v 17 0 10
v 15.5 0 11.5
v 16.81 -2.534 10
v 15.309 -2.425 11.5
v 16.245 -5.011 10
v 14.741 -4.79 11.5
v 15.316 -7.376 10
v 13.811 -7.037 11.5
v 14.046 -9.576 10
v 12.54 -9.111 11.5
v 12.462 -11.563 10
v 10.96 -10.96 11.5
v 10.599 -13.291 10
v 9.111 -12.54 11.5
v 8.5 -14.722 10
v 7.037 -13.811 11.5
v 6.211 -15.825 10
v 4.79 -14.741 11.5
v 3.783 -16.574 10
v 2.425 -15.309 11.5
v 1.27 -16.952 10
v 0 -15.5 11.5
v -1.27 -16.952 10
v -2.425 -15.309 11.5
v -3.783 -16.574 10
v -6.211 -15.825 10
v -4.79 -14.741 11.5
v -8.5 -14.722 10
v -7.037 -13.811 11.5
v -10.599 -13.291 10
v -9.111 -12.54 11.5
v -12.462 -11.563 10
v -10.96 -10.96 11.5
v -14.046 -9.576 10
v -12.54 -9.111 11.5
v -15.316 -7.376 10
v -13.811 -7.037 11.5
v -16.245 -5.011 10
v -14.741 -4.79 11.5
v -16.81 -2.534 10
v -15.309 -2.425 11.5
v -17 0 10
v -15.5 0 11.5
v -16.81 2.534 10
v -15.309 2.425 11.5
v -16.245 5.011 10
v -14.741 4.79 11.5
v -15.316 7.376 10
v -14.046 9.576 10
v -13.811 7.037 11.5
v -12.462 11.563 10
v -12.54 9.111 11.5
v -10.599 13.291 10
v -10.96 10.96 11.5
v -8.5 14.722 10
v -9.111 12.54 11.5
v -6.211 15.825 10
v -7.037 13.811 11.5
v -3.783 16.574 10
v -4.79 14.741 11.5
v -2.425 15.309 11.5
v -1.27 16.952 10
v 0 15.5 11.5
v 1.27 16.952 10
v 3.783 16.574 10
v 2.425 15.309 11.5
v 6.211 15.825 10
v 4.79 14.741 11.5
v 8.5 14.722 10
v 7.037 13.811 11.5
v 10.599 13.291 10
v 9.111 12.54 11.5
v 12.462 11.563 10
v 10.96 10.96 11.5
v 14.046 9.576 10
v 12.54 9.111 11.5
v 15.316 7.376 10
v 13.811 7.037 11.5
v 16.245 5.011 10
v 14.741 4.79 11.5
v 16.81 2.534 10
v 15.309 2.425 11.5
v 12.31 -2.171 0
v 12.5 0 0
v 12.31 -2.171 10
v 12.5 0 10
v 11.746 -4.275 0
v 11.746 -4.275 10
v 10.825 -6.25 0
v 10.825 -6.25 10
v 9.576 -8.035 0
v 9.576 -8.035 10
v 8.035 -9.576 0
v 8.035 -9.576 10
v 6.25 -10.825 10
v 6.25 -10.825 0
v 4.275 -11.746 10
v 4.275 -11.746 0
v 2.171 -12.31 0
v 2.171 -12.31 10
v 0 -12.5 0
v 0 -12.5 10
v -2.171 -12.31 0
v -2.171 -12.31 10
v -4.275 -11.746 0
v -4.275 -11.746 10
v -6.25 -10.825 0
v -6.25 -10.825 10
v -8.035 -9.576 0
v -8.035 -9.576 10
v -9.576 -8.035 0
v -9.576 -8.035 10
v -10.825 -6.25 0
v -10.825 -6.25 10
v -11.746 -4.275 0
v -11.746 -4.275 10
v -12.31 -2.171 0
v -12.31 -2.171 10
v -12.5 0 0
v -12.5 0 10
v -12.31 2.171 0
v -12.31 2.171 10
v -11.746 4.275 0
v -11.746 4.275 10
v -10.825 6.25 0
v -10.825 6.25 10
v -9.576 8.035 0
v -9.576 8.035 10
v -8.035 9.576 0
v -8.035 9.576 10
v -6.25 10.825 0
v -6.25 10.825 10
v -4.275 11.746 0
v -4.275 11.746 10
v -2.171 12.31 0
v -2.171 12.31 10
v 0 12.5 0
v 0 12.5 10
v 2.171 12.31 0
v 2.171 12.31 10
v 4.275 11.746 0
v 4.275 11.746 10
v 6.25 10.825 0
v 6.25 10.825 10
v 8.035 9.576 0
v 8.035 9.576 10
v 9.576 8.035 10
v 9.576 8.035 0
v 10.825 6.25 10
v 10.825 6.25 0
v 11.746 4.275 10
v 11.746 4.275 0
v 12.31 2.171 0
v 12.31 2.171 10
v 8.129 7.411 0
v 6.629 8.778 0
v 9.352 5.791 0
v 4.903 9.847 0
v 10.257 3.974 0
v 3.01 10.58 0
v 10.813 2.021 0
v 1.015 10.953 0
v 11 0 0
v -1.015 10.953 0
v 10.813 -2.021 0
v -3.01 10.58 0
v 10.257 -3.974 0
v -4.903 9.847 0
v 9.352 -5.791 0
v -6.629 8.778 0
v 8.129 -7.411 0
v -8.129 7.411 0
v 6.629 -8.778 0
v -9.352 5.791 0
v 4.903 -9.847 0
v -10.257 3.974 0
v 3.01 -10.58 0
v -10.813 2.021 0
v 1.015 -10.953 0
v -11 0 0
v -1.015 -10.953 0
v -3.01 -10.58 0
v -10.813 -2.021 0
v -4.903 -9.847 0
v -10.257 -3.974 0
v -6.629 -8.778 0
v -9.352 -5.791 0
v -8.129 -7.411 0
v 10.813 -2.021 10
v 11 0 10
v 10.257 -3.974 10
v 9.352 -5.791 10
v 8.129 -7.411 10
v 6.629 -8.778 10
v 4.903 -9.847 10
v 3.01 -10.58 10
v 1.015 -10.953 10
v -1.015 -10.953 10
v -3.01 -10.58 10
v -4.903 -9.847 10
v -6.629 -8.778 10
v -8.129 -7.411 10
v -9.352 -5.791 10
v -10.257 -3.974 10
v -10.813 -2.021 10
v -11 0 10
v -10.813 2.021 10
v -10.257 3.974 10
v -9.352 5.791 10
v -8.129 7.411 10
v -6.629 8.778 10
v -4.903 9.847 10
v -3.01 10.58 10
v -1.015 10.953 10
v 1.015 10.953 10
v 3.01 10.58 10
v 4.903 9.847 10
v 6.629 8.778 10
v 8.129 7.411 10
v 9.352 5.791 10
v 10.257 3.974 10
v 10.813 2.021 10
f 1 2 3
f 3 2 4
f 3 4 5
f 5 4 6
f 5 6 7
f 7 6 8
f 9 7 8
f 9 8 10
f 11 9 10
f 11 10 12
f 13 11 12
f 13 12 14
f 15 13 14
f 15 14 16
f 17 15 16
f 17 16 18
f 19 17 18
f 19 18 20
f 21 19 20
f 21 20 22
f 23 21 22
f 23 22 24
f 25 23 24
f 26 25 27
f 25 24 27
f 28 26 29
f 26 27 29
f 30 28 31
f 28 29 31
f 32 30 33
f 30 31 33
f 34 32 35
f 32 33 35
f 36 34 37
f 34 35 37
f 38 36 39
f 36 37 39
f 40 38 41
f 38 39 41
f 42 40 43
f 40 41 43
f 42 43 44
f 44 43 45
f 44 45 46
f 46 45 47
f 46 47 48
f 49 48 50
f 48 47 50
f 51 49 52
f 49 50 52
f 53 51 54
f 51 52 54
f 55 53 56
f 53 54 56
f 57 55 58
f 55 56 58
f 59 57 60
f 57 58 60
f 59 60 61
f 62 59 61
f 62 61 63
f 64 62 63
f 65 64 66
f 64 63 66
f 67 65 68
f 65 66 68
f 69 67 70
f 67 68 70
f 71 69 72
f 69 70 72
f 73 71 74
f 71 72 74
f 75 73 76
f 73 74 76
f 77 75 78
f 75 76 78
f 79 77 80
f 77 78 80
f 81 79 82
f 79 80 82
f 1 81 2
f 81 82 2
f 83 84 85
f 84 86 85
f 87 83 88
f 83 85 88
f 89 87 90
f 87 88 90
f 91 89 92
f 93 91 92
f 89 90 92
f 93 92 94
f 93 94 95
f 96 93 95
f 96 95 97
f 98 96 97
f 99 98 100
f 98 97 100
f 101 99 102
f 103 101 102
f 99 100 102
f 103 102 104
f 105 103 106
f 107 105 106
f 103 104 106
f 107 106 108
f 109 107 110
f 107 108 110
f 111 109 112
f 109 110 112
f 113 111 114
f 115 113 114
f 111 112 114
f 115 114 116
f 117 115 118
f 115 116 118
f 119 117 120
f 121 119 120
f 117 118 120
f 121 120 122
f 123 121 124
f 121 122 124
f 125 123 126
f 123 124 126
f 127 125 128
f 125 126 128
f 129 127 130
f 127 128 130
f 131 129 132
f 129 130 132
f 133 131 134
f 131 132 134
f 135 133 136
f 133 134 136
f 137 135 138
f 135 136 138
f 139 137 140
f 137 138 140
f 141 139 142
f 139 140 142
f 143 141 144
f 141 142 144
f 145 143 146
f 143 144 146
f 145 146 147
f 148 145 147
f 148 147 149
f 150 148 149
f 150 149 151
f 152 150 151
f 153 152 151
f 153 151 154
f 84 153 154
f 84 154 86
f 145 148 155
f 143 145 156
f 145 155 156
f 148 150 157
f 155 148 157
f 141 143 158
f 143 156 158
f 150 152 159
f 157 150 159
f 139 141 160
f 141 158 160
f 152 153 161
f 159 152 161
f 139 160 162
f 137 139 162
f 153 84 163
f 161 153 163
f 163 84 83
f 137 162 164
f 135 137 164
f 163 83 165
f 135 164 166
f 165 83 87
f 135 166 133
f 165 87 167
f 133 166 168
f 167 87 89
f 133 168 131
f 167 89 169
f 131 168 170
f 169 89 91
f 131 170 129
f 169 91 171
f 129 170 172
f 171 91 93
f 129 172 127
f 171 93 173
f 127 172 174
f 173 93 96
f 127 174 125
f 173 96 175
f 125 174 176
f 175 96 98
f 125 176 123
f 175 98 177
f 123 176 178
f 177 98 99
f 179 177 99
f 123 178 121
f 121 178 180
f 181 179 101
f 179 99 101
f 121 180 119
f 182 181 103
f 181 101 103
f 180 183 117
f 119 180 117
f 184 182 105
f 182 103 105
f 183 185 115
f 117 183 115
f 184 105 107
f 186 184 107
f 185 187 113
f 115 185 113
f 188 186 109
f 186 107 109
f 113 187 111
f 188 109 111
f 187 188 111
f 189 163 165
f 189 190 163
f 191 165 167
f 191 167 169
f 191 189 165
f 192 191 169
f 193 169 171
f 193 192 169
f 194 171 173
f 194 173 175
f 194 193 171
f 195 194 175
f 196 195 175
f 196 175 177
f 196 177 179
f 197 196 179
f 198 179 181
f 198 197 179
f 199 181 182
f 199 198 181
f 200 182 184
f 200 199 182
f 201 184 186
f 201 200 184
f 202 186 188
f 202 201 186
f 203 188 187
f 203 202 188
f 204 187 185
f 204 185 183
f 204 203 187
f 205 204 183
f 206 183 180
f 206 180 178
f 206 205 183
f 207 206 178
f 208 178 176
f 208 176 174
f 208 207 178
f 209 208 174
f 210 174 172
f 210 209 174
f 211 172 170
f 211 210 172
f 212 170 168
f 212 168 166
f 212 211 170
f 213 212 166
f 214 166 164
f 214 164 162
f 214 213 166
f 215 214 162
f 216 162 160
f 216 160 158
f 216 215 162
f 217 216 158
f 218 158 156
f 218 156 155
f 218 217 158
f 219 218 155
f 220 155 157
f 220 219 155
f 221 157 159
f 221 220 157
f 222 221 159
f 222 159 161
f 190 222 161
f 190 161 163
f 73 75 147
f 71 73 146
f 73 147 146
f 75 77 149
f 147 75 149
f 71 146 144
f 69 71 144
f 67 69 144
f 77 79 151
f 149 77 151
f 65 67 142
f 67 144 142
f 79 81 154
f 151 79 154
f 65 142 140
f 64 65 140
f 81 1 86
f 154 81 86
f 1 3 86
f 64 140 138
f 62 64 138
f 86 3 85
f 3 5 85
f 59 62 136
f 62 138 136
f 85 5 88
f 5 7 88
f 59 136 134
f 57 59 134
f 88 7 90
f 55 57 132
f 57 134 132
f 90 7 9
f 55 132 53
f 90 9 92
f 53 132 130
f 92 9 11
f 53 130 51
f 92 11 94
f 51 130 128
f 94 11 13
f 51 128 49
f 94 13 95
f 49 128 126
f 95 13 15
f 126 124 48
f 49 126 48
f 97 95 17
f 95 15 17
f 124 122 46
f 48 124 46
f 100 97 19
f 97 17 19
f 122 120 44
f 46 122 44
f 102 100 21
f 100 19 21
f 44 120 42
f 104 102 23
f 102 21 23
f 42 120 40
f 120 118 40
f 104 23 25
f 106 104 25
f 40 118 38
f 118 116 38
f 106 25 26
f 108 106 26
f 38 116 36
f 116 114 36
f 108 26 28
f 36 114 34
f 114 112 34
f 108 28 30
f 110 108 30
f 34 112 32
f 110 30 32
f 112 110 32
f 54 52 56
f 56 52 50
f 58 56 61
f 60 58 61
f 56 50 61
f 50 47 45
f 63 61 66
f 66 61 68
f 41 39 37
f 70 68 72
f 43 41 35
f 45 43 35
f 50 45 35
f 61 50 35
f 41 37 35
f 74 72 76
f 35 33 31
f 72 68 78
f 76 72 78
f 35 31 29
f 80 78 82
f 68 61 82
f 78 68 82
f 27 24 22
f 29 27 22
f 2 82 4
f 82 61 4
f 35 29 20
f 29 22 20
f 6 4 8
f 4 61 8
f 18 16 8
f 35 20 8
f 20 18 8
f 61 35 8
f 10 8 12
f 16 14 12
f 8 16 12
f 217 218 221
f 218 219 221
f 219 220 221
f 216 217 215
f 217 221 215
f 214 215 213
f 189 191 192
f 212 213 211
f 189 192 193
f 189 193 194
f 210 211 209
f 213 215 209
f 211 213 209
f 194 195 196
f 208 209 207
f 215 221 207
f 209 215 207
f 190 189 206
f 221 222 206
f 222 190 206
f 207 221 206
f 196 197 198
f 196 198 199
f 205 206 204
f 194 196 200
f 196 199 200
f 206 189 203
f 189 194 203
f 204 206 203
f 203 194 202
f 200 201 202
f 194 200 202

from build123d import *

# Parameters (mm, degrees)
F0_W = 1.5
F0_H = 10


# Not quite as in the source:
# - a fillet or chamfer that OpenCascade refuses, or shapes differently, is made with other operations: its cross-section is extruded or revolved along the edge and cut away or added


with BuildPart() as f1:
    # F0 (on Front) → F1 (revolve)
    with BuildSketch(Plane.XZ):
        Polygon((0, 11.5), (0, 10), (11, 10), (12.5, 10), (17.5, 10), (17.5, 11.5), align=None)
        with Locations((11.75, 5)):
            Rectangle(F0_W, F0_H)
    revolve(axis=Axis((0, 0, 10.75), (0, 0, -1)))

    # F2: chamfer of 2 on 1 edges, made by hand

    # F2_s1 → F2_t2 (revolve, cut)
    with BuildSketch(Plane.XZ):
        Polygon((17.5, 9.5), (15.5, 11.5), (17.5, 11.5), align=None)
    revolve(axis=Axis((0, 0, 11.5), (0, 0, -1)), mode=Mode.SUBTRACT)


solid = f1.part
